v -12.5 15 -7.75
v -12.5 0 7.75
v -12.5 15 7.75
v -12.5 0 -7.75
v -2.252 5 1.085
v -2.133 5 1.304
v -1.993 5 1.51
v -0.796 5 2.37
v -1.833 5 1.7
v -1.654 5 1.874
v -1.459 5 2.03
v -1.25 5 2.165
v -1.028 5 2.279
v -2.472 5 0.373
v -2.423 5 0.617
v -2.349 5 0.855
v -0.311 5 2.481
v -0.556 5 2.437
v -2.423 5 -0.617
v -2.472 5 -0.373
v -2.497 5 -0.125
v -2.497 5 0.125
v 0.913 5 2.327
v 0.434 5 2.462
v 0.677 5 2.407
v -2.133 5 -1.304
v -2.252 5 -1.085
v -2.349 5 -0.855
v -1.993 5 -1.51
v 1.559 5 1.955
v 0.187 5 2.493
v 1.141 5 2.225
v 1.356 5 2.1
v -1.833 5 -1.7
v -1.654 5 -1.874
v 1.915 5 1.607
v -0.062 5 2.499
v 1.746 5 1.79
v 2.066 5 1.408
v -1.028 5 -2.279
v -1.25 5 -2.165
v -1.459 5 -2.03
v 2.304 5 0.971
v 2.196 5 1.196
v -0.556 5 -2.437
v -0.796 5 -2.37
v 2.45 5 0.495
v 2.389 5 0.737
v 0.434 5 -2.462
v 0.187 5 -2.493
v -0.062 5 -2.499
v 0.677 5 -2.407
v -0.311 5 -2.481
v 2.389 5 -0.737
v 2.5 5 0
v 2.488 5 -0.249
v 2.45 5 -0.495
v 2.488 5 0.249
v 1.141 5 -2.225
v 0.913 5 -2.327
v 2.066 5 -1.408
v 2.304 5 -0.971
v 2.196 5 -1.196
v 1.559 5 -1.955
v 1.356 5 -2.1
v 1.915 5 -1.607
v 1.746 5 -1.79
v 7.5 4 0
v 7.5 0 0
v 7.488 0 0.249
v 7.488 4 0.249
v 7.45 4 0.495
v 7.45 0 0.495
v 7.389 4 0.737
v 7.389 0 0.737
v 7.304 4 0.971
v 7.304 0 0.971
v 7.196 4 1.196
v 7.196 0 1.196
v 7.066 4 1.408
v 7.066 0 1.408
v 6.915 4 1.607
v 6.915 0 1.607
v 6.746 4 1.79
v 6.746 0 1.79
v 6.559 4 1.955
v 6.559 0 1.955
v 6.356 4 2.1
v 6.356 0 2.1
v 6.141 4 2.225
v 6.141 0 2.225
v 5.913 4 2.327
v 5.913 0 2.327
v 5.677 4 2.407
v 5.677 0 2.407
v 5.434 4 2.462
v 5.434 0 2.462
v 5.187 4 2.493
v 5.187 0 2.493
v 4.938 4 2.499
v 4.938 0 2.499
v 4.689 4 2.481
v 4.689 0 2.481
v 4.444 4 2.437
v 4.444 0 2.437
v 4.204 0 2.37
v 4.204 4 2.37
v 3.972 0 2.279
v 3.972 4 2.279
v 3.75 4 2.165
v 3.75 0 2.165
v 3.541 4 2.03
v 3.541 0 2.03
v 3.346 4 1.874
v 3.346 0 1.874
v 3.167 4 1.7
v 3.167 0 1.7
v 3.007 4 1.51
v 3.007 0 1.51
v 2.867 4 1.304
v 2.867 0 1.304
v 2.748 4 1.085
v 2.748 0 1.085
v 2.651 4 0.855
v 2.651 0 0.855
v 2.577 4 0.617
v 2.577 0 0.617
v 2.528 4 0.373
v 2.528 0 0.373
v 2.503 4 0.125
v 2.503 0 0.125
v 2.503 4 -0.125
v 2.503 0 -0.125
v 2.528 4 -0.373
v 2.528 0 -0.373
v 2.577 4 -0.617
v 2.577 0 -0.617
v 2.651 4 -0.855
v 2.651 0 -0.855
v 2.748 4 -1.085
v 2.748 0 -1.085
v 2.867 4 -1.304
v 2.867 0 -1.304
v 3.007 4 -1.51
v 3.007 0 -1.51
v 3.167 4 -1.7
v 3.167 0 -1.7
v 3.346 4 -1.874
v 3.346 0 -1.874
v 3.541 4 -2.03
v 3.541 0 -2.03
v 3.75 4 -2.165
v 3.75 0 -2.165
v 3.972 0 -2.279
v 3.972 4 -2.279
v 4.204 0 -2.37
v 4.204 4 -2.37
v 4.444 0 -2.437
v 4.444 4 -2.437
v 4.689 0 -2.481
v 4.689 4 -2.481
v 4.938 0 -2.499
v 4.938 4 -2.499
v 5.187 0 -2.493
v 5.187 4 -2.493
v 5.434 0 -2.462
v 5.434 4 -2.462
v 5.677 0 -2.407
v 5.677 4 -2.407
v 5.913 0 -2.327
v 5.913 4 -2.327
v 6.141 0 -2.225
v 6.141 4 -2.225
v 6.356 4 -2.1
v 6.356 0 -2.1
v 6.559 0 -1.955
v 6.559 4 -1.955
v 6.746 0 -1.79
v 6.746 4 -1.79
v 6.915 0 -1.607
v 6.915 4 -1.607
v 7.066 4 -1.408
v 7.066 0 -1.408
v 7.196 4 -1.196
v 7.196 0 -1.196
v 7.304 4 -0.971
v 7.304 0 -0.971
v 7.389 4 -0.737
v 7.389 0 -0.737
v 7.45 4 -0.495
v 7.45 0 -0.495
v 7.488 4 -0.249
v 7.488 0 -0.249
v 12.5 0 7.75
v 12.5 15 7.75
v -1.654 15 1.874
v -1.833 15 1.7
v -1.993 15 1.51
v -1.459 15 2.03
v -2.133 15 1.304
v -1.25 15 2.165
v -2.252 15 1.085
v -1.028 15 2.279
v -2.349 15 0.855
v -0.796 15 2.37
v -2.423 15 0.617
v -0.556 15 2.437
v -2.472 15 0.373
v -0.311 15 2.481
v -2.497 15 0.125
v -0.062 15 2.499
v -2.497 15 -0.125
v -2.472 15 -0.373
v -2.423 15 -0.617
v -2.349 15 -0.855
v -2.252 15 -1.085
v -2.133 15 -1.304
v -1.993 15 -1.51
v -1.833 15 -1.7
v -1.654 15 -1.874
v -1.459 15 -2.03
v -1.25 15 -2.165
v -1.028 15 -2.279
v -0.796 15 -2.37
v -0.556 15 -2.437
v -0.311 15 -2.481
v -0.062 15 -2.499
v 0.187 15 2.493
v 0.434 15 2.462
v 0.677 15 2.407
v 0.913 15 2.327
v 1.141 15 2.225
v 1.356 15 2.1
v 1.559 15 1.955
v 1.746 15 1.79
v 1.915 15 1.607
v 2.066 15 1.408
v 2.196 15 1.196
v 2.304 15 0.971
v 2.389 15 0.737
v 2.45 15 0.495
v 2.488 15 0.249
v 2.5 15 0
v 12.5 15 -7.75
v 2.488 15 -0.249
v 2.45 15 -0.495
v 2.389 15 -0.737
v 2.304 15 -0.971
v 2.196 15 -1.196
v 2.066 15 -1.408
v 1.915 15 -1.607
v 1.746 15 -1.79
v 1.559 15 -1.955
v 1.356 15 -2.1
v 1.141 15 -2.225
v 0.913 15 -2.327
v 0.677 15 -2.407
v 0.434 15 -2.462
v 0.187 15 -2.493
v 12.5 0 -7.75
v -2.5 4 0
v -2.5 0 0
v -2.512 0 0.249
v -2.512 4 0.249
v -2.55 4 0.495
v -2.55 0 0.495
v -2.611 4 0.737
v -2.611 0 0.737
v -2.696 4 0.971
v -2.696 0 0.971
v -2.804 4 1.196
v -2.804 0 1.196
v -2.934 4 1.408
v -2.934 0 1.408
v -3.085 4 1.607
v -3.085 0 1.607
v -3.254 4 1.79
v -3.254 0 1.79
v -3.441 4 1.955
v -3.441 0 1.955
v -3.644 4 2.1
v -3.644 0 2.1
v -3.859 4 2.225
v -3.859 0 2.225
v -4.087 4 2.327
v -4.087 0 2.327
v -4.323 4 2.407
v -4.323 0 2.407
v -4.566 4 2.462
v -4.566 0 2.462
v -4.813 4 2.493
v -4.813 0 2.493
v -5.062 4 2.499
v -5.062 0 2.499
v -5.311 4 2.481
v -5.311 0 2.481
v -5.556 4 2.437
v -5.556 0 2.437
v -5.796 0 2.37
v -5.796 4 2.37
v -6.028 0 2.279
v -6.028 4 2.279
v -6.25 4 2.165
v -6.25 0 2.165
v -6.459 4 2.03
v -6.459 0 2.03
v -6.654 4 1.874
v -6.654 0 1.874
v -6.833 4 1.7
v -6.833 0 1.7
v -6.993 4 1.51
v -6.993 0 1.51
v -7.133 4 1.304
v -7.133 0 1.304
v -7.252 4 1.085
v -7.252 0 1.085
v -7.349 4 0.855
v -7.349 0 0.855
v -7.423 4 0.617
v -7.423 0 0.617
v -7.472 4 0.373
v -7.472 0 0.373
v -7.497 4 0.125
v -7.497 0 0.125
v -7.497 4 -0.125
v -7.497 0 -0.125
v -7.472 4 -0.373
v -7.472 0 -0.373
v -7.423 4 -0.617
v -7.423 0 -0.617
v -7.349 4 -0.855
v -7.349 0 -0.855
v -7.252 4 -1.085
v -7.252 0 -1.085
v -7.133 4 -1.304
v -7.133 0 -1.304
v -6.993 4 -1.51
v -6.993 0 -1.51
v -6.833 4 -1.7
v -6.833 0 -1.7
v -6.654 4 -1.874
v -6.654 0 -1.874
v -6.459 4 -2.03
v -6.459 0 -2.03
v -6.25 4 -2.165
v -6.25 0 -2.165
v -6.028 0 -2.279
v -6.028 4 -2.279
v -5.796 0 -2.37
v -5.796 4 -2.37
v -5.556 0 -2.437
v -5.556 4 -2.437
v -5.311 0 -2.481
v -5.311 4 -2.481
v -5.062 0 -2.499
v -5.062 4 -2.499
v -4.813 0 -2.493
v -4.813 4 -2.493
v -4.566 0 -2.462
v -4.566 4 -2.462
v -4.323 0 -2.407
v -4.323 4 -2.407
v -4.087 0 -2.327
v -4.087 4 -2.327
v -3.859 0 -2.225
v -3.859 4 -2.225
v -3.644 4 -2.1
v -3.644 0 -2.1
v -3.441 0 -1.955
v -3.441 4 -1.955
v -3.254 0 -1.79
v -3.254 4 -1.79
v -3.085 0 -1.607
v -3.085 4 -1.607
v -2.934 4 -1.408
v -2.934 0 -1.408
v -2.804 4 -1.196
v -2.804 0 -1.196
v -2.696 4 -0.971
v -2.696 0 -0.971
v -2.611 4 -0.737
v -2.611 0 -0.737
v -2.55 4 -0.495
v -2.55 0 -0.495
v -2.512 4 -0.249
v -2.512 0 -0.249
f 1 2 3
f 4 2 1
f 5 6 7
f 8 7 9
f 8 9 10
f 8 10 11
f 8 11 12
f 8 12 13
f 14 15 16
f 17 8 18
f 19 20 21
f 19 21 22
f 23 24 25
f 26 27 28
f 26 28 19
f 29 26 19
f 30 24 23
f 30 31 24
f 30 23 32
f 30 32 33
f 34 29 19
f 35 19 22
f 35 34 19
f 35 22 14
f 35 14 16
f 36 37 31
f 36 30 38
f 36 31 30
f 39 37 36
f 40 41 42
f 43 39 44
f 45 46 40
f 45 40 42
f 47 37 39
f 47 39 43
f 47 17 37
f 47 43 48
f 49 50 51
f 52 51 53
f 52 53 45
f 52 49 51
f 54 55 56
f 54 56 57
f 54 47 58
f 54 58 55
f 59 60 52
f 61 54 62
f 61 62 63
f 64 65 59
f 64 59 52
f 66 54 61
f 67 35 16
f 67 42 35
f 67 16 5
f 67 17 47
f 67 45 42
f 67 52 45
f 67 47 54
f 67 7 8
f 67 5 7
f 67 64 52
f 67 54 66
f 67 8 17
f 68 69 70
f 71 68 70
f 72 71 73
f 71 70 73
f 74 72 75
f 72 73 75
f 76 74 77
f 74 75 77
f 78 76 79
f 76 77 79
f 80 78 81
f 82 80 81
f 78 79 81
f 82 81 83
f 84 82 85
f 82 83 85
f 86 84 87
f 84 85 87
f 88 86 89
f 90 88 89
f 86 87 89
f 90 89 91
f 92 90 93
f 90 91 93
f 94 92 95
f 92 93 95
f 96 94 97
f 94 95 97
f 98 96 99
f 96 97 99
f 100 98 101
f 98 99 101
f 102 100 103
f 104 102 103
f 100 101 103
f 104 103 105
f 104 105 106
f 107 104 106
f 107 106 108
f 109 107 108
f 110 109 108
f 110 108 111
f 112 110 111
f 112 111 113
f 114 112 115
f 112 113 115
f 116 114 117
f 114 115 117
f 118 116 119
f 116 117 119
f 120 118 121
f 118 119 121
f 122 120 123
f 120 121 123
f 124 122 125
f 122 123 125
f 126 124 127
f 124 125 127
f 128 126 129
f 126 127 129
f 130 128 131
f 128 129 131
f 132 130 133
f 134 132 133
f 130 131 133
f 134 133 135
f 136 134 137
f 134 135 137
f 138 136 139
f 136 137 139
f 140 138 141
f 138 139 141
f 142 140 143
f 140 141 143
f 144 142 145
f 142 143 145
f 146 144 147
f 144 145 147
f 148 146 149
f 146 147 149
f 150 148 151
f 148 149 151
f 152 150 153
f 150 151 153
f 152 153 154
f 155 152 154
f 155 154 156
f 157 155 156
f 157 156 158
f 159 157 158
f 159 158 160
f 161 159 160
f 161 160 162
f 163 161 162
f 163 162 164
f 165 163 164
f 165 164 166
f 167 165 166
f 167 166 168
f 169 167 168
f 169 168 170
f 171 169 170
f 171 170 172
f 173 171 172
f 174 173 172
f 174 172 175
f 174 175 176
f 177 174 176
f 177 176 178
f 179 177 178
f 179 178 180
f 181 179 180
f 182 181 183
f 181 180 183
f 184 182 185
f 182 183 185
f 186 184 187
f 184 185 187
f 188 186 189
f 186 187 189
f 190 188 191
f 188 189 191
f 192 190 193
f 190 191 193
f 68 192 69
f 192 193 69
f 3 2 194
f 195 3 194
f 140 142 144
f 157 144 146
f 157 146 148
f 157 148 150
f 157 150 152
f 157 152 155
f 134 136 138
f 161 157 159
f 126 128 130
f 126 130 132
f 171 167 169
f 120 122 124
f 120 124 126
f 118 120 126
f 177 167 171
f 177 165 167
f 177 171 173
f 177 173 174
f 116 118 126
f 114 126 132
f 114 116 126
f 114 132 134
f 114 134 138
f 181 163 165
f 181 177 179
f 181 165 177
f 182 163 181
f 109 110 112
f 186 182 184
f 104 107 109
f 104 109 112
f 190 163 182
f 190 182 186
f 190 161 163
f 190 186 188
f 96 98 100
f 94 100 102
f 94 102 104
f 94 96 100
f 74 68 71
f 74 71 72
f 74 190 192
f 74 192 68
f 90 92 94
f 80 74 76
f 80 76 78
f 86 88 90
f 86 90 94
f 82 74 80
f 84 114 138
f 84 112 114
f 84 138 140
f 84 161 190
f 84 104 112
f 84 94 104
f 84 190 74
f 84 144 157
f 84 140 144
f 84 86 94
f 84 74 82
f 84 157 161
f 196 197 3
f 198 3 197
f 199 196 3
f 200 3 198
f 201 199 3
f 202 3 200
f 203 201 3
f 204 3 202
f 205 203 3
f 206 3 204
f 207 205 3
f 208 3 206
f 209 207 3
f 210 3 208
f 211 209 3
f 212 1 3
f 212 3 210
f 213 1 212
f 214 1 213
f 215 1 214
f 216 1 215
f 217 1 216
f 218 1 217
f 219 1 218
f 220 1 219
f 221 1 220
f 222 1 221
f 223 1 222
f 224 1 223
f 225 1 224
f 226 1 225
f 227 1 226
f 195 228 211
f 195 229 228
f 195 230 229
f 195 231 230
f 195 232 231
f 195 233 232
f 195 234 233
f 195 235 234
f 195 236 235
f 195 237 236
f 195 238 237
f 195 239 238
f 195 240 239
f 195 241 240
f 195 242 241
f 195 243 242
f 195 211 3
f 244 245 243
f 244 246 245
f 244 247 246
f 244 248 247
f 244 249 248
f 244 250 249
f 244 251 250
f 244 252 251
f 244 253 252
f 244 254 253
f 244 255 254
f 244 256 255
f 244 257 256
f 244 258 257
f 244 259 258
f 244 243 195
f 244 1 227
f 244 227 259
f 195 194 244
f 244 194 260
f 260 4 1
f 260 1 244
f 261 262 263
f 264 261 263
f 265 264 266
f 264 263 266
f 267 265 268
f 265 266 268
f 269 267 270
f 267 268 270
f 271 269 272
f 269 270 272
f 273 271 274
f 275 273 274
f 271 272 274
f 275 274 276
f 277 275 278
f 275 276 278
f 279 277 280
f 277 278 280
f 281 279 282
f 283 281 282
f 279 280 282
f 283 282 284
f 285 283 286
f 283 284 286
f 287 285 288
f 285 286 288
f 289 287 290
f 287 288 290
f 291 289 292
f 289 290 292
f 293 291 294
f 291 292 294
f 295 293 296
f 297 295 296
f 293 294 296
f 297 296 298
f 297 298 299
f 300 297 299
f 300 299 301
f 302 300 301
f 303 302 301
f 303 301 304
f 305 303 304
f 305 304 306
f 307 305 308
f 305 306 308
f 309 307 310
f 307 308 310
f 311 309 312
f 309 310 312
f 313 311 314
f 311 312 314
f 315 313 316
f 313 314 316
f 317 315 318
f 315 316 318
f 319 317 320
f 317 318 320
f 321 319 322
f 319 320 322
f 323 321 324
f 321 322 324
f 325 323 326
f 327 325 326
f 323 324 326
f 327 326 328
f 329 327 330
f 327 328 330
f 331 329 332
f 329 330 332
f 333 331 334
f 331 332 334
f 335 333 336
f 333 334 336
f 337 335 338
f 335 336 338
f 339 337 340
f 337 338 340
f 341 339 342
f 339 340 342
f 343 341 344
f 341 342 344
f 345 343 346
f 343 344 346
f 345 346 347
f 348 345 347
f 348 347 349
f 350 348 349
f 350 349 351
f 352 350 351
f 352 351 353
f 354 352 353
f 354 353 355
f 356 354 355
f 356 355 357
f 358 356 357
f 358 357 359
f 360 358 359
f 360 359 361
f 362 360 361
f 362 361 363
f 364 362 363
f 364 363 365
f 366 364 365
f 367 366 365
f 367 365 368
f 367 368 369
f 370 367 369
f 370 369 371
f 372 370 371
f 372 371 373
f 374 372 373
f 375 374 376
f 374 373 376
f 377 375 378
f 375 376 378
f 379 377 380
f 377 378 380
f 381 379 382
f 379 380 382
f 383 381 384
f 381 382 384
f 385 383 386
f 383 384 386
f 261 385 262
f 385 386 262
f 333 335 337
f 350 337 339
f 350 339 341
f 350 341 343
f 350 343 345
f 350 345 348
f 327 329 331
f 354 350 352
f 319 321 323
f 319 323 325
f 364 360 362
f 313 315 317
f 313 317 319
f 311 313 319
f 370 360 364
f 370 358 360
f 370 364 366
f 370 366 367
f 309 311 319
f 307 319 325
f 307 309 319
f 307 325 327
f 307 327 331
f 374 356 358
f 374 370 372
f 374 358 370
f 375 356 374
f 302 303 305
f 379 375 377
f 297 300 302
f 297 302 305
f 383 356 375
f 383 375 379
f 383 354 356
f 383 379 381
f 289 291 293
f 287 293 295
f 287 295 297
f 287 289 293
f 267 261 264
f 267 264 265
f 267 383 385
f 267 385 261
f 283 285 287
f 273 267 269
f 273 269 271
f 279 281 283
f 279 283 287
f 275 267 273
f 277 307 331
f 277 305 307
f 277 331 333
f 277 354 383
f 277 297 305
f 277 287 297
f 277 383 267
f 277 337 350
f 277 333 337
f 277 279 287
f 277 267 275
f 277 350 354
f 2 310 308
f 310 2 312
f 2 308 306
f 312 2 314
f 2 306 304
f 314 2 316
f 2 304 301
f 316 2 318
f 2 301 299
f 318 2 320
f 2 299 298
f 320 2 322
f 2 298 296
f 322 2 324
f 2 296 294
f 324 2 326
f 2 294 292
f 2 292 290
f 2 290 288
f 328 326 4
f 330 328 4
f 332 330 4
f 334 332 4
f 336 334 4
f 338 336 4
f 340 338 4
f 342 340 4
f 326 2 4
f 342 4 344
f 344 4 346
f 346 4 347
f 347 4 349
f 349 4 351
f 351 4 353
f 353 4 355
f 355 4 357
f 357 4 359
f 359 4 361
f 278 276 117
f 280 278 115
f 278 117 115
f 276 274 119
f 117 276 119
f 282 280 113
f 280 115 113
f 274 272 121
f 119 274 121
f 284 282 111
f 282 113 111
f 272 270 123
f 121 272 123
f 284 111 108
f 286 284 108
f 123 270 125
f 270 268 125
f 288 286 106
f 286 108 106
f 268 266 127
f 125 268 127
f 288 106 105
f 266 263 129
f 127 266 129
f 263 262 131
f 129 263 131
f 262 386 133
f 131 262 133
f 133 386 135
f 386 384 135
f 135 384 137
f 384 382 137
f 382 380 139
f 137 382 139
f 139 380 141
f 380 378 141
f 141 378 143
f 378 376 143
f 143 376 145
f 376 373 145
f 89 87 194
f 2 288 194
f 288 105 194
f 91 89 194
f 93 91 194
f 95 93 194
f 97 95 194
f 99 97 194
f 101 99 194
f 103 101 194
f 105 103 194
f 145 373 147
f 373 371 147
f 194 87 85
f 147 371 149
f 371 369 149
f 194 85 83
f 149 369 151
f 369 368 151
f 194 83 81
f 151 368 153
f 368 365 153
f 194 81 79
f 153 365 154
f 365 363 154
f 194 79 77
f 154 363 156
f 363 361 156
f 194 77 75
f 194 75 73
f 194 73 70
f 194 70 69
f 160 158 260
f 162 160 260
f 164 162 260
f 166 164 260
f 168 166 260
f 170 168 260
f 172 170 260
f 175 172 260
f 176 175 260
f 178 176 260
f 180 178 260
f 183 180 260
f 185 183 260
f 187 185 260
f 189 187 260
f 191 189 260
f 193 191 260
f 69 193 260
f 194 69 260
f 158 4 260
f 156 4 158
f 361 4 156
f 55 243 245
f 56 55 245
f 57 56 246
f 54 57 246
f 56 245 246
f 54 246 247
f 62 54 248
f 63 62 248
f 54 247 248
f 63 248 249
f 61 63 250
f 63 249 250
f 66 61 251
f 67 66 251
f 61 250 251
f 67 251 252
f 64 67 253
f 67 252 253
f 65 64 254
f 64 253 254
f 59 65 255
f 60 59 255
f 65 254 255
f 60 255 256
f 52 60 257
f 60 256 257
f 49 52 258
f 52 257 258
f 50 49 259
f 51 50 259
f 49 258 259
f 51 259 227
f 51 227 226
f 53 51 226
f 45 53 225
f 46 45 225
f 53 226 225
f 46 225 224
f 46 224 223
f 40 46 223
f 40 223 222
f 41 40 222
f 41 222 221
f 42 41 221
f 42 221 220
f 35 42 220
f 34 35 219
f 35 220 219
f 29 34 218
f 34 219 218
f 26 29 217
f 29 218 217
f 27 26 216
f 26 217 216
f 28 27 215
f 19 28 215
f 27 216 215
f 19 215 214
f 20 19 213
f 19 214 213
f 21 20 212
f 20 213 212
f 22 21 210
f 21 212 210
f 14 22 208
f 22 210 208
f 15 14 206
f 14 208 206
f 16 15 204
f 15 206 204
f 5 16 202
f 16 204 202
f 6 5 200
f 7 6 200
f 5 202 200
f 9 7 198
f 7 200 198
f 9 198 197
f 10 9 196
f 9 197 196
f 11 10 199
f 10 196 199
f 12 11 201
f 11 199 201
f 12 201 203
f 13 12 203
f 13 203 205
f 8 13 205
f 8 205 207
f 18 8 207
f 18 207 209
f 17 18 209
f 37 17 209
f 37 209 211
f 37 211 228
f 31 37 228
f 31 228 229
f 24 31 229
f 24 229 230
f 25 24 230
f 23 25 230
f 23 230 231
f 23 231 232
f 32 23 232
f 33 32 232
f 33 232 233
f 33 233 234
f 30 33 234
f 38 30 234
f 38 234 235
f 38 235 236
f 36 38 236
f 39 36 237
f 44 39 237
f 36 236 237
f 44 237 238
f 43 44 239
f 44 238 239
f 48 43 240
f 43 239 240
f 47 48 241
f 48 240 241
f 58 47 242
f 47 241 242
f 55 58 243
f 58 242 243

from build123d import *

# Parameters (mm, degrees)
SKETCH1_W           = 25
SKETCH1_H           = 15.5
BOSS_EXTRUDE1_DEPTH = 15
SKETCH2_R           = 2.5
CUT_EXTRUDE1_DEPTH  = 10
SKETCH4_R           = 2.5
CUT_EXTRUDE3_DEPTH  = 4
SKETCH5_R           = 2.5
CUT_EXTRUDE4_DEPTH  = 4


with BuildPart() as part:
    # Sketch1 → Boss-Extrude1 (new body)
    with BuildSketch(Plane(origin=(0, 0, 0), x_dir=(1, 0, 0), z_dir=(0, 1, 0))):
        Rectangle(SKETCH1_W, SKETCH1_H)
    extrude(amount=BOSS_EXTRUDE1_DEPTH)

    # Sketch2 → Cut-Extrude1 (cut)
    with BuildSketch(Plane(origin=(0, 15, 0), x_dir=(1, 0, 0), z_dir=(0, 1, 0))):
        Circle(SKETCH2_R)
    extrude(amount=-CUT_EXTRUDE1_DEPTH, mode=Mode.SUBTRACT)

    # Sketch4 → Cut-Extrude3 (cut)
    with BuildSketch(Plane.XZ):
        with Locations((5, 0)):
            Circle(SKETCH4_R)
    extrude(amount=-CUT_EXTRUDE3_DEPTH, mode=Mode.SUBTRACT)

    # Sketch5 → Cut-Extrude4 (cut)
    with BuildSketch(Plane.XZ):
        with Locations((-5, 0)):
            Circle(SKETCH5_R)
    extrude(amount=-CUT_EXTRUDE4_DEPTH, mode=Mode.SUBTRACT)


solid = part.part
